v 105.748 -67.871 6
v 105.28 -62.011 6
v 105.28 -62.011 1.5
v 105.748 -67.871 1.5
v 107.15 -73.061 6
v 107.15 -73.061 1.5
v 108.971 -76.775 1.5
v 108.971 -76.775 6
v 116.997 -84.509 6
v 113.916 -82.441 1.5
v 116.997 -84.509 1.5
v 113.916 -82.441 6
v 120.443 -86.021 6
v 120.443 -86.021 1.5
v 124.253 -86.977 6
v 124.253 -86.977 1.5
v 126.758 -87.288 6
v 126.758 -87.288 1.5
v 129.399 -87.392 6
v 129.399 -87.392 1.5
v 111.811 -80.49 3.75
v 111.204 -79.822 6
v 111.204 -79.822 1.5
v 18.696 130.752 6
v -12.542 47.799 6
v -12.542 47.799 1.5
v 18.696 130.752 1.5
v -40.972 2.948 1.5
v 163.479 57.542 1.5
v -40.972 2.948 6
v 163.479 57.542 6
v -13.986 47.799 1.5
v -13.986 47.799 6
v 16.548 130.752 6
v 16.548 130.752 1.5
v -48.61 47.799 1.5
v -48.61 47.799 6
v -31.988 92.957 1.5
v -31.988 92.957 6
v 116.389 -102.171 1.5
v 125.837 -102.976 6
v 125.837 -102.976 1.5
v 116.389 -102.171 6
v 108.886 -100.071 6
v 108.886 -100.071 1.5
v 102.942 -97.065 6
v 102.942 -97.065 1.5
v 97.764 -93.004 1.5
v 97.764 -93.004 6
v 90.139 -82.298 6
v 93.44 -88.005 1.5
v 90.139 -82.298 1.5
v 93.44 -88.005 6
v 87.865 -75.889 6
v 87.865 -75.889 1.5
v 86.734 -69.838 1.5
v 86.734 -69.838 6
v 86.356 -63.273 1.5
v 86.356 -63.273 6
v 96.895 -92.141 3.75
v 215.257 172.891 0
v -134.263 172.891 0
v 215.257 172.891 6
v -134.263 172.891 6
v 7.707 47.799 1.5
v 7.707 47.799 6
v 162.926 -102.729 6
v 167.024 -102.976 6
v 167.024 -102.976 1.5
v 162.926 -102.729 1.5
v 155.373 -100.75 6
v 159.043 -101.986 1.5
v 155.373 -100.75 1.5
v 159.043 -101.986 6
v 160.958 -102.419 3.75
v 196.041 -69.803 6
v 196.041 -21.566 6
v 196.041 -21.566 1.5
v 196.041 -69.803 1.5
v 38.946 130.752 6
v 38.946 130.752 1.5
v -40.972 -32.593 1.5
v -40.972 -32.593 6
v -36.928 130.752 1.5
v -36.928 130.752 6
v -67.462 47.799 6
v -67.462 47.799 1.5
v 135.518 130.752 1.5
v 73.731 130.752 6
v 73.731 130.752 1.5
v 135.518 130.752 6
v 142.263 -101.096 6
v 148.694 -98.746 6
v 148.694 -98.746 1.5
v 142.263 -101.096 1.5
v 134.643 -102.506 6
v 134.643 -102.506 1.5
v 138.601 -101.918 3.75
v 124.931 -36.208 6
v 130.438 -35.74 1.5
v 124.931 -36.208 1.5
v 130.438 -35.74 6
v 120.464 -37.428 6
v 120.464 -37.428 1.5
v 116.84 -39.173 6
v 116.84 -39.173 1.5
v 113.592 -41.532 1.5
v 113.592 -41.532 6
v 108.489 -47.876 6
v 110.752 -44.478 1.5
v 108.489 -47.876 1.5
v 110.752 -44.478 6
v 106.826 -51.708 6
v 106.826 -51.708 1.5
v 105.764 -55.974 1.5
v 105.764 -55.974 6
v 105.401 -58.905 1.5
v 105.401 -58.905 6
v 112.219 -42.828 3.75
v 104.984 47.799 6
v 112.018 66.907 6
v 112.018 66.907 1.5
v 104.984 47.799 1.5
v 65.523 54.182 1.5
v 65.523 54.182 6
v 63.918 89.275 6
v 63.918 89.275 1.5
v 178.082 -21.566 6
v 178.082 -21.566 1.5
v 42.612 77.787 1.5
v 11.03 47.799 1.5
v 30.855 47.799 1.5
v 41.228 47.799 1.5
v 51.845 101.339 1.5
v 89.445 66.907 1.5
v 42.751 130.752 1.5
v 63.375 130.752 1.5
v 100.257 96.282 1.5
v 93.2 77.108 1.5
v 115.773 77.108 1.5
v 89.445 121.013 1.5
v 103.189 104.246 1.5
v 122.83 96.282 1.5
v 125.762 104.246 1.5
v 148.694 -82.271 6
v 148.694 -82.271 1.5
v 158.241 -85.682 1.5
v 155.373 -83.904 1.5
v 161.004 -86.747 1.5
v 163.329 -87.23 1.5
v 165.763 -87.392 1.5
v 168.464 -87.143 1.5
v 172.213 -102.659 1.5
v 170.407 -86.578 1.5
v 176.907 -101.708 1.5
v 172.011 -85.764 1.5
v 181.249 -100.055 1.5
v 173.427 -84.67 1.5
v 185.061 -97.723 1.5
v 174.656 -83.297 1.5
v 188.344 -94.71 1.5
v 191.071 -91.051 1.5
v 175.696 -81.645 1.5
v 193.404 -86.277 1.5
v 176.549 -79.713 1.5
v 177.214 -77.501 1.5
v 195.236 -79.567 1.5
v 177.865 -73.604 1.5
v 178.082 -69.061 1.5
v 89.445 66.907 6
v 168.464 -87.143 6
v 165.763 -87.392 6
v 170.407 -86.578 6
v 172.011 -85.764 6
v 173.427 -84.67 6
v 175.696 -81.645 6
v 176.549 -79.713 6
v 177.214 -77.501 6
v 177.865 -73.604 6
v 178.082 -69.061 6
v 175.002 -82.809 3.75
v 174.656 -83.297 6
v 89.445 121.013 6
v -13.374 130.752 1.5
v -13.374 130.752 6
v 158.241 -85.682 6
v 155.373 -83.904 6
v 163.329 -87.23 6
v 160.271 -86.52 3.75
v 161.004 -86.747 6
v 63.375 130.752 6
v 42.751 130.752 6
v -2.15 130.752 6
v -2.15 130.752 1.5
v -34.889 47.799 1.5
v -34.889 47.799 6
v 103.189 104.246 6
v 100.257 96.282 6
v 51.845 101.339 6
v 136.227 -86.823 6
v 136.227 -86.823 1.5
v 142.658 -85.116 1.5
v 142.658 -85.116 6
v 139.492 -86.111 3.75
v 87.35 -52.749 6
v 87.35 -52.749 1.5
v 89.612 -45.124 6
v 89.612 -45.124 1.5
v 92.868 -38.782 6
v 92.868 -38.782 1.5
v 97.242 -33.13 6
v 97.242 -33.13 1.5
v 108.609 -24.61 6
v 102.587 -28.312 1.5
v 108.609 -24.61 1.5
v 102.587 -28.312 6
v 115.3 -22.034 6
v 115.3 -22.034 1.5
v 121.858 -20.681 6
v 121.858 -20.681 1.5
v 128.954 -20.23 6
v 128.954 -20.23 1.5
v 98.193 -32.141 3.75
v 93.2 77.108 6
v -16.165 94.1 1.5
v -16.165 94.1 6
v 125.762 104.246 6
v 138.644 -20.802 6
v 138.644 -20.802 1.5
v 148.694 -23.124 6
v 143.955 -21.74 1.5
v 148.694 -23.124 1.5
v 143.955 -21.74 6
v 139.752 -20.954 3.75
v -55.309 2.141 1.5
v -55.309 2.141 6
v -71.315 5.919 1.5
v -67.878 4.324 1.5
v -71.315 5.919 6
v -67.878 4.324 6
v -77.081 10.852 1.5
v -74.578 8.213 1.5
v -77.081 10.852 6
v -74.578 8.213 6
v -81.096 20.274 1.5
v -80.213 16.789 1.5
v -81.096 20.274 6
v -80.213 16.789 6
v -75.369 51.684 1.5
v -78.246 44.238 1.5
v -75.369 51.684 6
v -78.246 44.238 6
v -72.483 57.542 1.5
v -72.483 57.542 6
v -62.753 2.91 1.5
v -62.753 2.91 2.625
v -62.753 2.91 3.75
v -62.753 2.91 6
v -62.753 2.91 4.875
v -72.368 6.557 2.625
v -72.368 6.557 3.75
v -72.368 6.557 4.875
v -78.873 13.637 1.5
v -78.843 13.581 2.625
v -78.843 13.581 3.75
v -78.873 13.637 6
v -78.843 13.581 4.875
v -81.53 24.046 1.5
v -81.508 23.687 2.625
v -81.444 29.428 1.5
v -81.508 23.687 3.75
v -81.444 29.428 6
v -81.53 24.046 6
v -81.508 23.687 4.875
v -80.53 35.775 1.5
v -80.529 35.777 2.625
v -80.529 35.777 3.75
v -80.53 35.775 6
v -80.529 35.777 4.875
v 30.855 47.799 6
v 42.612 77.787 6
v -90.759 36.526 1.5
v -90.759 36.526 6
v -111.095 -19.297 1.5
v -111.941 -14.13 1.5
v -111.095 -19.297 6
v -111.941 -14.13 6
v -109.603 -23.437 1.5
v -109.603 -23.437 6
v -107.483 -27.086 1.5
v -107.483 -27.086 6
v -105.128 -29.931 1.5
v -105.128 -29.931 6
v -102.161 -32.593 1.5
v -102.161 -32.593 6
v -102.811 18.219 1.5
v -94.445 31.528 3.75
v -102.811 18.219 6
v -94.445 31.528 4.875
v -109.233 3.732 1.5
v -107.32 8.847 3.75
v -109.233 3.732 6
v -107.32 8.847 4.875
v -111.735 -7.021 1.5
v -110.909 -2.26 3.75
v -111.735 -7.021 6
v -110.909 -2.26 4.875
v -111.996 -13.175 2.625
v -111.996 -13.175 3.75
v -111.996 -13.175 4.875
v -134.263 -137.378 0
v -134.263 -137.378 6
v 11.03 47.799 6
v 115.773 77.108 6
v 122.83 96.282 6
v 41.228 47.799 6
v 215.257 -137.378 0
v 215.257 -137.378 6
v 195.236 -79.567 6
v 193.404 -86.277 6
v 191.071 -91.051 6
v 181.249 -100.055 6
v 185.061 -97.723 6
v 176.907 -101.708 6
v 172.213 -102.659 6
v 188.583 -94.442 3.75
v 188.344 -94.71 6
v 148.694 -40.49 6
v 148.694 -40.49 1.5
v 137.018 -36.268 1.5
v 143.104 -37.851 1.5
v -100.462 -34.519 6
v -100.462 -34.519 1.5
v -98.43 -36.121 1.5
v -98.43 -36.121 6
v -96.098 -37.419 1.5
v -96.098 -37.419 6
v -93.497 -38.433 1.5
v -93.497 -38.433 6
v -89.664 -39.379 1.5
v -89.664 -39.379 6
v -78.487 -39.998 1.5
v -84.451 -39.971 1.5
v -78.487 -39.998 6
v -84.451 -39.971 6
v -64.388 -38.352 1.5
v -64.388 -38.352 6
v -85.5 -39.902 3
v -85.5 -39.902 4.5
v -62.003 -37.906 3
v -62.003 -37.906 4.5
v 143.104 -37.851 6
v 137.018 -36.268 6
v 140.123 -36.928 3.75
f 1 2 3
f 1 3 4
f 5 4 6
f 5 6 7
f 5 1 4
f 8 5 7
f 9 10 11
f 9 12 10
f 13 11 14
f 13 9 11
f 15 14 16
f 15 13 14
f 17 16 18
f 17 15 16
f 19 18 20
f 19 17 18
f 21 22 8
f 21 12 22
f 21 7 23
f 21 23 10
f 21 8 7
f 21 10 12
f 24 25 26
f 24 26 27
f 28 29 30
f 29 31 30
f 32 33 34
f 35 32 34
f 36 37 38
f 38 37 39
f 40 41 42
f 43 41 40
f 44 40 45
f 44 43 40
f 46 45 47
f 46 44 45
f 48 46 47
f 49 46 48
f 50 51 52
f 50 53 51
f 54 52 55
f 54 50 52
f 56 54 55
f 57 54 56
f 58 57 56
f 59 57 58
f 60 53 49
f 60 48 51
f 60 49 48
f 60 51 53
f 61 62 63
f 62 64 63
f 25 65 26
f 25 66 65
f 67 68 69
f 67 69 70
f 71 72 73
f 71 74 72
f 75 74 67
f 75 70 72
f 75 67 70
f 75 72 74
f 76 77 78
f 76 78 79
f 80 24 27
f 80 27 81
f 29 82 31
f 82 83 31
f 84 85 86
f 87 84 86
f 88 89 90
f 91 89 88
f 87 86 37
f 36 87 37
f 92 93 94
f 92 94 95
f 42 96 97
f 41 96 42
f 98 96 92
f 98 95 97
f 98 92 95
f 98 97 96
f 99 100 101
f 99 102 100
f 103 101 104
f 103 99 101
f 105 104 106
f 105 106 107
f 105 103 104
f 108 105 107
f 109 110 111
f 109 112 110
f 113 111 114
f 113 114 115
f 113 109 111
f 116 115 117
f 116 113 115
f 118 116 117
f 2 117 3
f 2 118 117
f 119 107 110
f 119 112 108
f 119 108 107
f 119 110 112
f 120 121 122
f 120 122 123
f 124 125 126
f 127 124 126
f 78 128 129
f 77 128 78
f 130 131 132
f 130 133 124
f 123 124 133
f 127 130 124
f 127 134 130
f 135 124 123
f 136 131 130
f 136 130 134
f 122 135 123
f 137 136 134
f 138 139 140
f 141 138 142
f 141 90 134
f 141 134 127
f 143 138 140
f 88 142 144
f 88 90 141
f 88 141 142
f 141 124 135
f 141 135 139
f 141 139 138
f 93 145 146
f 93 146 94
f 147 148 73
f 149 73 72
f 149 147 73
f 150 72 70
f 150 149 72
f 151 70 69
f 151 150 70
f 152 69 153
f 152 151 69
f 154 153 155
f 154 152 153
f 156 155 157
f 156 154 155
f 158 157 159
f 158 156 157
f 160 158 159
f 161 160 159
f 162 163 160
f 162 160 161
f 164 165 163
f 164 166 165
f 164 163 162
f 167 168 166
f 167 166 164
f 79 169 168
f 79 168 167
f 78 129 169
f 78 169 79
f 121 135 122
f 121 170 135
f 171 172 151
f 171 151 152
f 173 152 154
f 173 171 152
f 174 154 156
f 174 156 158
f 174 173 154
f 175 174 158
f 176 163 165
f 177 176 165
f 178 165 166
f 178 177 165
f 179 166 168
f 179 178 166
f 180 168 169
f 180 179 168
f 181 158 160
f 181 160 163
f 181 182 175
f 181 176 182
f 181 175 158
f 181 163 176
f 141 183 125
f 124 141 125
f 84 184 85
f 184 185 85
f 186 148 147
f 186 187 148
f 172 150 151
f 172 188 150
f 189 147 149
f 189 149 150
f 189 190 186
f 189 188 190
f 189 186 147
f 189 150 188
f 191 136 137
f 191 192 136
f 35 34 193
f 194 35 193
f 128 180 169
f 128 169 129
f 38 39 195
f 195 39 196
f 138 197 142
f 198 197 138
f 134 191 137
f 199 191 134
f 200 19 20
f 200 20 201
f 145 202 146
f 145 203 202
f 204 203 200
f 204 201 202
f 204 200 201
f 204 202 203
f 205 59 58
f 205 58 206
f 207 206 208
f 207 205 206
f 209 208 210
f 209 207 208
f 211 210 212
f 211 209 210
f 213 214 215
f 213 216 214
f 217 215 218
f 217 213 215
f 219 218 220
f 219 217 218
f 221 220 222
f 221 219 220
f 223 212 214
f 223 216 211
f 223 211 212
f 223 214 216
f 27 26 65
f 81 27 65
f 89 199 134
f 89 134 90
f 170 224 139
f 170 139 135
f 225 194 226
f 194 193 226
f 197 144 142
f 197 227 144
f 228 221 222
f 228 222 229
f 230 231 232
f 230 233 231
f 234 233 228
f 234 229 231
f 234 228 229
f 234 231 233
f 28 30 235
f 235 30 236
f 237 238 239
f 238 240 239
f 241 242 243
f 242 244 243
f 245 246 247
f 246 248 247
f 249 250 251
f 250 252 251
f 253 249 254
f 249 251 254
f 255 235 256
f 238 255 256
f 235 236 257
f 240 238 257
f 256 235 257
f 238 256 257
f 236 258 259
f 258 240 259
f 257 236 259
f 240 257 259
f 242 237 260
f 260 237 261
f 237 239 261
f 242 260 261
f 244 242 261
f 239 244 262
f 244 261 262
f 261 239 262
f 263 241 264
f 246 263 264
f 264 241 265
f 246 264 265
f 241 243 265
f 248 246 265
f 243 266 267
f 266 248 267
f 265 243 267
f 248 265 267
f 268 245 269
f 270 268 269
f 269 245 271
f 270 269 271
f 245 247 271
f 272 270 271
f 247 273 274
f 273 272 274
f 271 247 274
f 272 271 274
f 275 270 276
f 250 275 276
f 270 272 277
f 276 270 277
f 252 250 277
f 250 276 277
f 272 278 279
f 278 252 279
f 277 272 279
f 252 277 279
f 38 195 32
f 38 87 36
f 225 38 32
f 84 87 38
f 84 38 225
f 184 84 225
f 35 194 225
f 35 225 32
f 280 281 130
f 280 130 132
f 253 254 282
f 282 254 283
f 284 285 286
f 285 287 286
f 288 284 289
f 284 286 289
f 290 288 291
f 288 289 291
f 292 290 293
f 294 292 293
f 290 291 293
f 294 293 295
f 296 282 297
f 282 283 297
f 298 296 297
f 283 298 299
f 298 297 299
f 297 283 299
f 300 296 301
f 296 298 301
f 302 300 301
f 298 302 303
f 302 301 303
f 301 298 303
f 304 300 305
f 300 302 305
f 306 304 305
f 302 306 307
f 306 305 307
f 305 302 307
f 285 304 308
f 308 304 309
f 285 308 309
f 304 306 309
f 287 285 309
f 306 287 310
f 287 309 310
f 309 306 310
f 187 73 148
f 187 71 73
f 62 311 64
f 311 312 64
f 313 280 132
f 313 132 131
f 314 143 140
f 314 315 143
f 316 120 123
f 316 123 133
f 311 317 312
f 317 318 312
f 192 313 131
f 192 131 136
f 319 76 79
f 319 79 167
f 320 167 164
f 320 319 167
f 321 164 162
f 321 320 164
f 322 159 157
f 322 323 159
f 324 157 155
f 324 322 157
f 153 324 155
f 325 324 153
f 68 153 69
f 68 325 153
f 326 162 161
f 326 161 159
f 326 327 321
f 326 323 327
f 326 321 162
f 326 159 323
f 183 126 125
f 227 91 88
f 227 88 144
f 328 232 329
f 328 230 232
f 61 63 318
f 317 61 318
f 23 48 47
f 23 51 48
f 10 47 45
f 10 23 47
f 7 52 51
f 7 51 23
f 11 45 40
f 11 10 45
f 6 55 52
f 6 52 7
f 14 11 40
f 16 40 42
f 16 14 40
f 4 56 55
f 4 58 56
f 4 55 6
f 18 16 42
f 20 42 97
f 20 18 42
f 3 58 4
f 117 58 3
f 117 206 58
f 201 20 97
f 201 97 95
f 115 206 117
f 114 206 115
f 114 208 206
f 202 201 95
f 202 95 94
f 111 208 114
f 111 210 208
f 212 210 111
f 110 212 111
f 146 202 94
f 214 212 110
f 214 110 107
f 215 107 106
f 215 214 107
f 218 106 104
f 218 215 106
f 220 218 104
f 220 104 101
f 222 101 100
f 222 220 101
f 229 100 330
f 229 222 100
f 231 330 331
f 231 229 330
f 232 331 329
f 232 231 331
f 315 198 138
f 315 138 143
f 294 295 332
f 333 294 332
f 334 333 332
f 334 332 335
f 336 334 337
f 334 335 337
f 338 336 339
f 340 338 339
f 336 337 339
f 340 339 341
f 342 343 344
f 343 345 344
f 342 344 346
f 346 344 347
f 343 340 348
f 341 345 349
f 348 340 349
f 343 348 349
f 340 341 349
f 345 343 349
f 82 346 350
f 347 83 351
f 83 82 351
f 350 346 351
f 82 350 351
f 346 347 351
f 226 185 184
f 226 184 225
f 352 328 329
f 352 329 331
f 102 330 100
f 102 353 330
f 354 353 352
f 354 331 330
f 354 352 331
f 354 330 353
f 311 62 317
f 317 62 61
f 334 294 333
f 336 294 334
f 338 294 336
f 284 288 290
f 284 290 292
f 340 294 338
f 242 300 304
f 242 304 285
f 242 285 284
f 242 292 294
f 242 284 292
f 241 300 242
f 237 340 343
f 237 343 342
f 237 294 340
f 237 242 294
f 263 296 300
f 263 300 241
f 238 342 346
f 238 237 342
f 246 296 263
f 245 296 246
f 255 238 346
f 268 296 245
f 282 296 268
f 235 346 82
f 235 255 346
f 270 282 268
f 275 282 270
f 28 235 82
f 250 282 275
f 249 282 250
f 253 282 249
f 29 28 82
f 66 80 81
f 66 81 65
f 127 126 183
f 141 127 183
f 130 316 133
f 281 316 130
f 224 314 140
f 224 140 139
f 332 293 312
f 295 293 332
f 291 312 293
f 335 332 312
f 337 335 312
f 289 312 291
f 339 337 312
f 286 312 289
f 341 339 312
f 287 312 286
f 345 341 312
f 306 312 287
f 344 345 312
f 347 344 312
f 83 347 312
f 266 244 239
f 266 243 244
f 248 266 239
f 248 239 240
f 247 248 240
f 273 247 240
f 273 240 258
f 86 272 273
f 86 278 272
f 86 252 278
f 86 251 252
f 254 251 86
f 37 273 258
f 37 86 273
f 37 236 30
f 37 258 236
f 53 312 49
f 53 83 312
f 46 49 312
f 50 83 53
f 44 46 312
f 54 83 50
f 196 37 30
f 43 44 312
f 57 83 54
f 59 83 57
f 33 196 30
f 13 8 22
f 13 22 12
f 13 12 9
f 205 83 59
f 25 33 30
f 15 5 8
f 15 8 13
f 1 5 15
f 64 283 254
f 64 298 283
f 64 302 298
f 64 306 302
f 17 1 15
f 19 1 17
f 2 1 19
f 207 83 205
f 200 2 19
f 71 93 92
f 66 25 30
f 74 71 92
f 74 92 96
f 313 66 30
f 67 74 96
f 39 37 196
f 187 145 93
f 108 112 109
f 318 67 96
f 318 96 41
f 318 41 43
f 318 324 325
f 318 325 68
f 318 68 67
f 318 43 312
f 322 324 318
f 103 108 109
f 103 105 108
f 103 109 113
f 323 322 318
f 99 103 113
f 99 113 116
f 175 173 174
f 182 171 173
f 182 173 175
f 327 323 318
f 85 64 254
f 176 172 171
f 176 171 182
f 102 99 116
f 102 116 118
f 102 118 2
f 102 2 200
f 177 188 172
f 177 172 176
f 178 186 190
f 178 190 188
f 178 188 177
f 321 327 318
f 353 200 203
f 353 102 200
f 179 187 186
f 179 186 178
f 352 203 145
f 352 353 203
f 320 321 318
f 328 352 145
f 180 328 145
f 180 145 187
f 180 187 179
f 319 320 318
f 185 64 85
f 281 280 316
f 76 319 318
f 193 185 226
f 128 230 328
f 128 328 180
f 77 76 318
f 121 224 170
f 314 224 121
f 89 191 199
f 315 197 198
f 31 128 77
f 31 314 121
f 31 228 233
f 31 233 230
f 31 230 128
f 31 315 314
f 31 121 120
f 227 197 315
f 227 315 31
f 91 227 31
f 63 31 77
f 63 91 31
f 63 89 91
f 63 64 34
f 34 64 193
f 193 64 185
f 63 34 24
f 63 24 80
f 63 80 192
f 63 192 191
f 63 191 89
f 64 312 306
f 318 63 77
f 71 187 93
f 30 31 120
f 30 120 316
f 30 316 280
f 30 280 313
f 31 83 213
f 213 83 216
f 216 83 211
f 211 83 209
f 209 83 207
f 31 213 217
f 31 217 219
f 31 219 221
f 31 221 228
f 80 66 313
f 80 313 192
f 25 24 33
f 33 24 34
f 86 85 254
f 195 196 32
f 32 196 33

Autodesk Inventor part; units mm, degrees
ref_plane "YZ Plane" through (0, 0, 0) normal (1, 0, 0) x (0, 1, 0)
ref_plane "XZ Plane" through (0, 0, 0) normal (0, 1, 0) x (-1, 0, 0)
ref_plane "XY Plane" through (0, 0, 0) normal (0, 0, 1) x (1, 0, 0)
sketch "Boceto1" plane through (0, 0, 0) normal (0, 0, 1) x (1, 0, 0)
  line L0 (-250, -250) -> (250, -250)
  line L1 (250, -250) -> (250, 250)
  line L2 (250, 250) -> (-250, 250)
  line L3 (-250, 250) -> (-250, -250)
  line L4 (-250, -250) -> (250, 250) construction
  line L5 (250, -250) -> (-250, 250) construction
  point P0 (0, 0)
  dimension "d0" = 500
  dimension "d1" = 500
extrude "Extrusión1" add sketch "Boceto1" along normal blind 6
sketch "Boceto4" plane through (0, 0, 6) normal (0, 0, 1) x (1, 0, 0)
  line L0 (-122.9682, 69.533) -> (177.0318, 69.533) construction
  line L1 (177.0318, 69.533) -> (177.0318, -53.8632) construction
  line L2 (177.0318, -53.8632) -> (-122.9682, -53.8632) construction
  line L3 (-122.9682, -53.8632) -> (-122.9682, 69.533) construction
  line L4 (163.4789, 57.5416) -> (-40.9722, 2.948)
  spline S0 degree 4 poles (-40.9722, 2.948) (-59.3478, 1.0194) (-98.1126, -3.325) (-80.4924, 43.1707) (-72.4826, 57.5416) knots 0 0 0 0 0 1 1 1 1 1
  spline S1 degree 4 poles (-72.4826, 57.5416) (-101.0846, 27.8162) (-107.584, 11.7419) (-123.1576, -16.2785) (-102.1609, -32.5927) knots 0 0 0 0 0 1 1 1 1 1
  spline S2 degree 3 poles (-102.1609, -32.5927) (-92.0174, -46.5521) (-57.6708, -37.567) (-40.9722, -32.5927) knots 0 0 0 0 1 1 1 1
  line L5 (-40.9722, -32.5927) -> (163.4789, 57.5416)
  point P0 (0, 0)
  point P1 (-62.9545, 2.949)
  point P2 (-77.976, 12.1095)
  point P3 (-80.9081, 33.7265)
  point P4 (-98.8634, 24.932)
  point P5 (-109.4889, 2.9481)
  point P6 (-111.753, -15.9522)
  point P7 (-88.6041, -39.5543)
  point P8 (-62.956, -38.0886)
  dimension "d19" = 300
extrude "Extrusión4" cut sketch "Boceto4" against normal blind 4.5
sketch "Boceto6" plane through (0, 0, 6) normal (0, 0, 1) x (1, 0, 0)
  line L0 (82.2007, -20.2301) -> (276.8192, -20.2301) construction
  line L1 (276.8192, -20.2301) -> (276.8192, -107.8084) construction
  line L2 (276.8192, -107.8084) -> (82.2007, -107.8084) construction
  line L3 (82.2007, -107.8084) -> (82.2007, -20.2301) construction
  spline S0 degree 2 poles (148.6942, -98.7459) (139.9372, -102.9759) (125.8371, -102.9759) knots 0 0 0 1 1 1
  spline S1 degree 2 poles (125.8371, -102.9759) (107.4326, -102.9759) (86.3565, -81.3061) (86.3565, -63.2728) knots 0 0 0 1 2 2 2
  spline S2 degree 2 poles (86.3565, -63.2728) (86.3565, -44.052) (110.03, -20.2301) (128.9539, -20.2301) knots 0 0 0 1 2 2 2
  spline S3 degree 2 poles (128.9539, -20.2301) (140.6794, -20.2301) (148.6942, -23.1243) knots 0 0 0 1 1 1
  line L4 (148.6942, -23.1243) -> (148.6942, -40.4898)
  spline S4 degree 2 poles (148.6942, -40.4898) (140.6794, -35.7403) (130.4382, -35.7403) knots 0 0 0 1 1 1
  spline S5 degree 2 poles (130.4382, -35.7403) (119.158, -35.7403) (105.2805, -49.9147) (105.2805, -62.0112) knots 0 0 0 1 2 2 2
  spline S6 degree 2 poles (105.2805, -62.0112) (105.2805, -73.5882) (118.3417, -87.3915) (129.3992, -87.3915) knots 0 0 0 1 2 2 2
  spline S7 degree 2 poles (129.3992, -87.3915) (139.9372, -87.3915) (148.6942, -82.2709) knots 0 0 0 1 1 1
  line L5 (148.6942, -82.2709) -> (148.6942, -98.7459)
  spline S8 degree 2 poles (196.0411, -69.8034) (196.0411, -85.9073) (181.1246, -102.9759) (167.0244, -102.9759) knots 0 0 0 1 2 2 2
  spline S9 degree 2 poles (167.0244, -102.9759) (160.7165, -102.9759) (155.3732, -100.7496) knots 0 0 0 1 1 1
  line L6 (155.3732, -100.7496) -> (155.3732, -83.9036)
  spline S10 degree 2 poles (155.3732, -83.9036) (159.9744, -87.3915) (165.7629, -87.3915) knots 0 0 0 1 1 1
  spline S11 degree 2 poles (165.7629, -87.3915) (178.082, -87.3915) (178.082, -69.0613) knots 0 0 0 1 1 1
  line L7 (178.082, -69.0613) -> (178.082, -21.5659)
  line L8 (178.082, -21.5659) -> (196.0411, -21.5659)
  line L9 (196.0411, -21.5659) -> (196.0411, -69.8034)
  point P0 (0, 0)
extrude "Extrusión5" cut sketch "Boceto6" against normal blind 4.5
sketch "Boceto7" plane through (0, 0, 6) normal (0, 0, 1) x (1, 0, 0)
  line L0 (-96.8701, 190.9254) -> (156.7066, 190.9254) construction
  line L1 (156.7066, 190.9254) -> (156.7066, -16.508) construction
  line L2 (156.7066, -16.508) -> (-96.8701, -16.508) construction
  line L3 (-96.8701, -16.508) -> (-96.8701, 190.9254) construction
  line L4 (-67.4617, 47.7989) -> (-48.6104, 47.7989)
  line L5 (-48.6104, 47.7989) -> (-31.9884, 92.9574)
  line L6 (-31.9884, 92.9574) -> (-34.8888, 47.7989)
  line L7 (-34.8888, 47.7989) -> (-13.9857, 47.7989)
  line L8 (-13.9857, 47.7989) -> (16.5477, 130.7517)
  line L9 (16.5477, 130.7517) -> (-2.1497, 130.7517)
  line L10 (-13.3744, 130.7517) -> (-36.9283, 130.7517)
  line L11 (-36.9283, 130.7517) -> (-67.4617, 47.7989)
  line L12 (7.7072, 47.7989) -> (-12.5423, 47.7989)
  line L13 (-12.5423, 47.7989) -> (18.6965, 130.7517)
  line L14 (18.6965, 130.7517) -> (38.946, 130.7517)
  line L15 (38.946, 130.7517) -> (7.7072, 47.7989)
  line L16 (-13.3744, 130.7517) -> (-16.165, 94.0996)
  line L17 (-2.1497, 130.7517) -> (-16.165, 94.0996)
  line L18 (42.7507, 130.7517) -> (63.3753, 130.7517)
  line L19 (63.3753, 130.7517) -> (51.8446, 101.3389)
  line L20 (51.8446, 101.3389) -> (73.7311, 130.7517)
  line L21 (73.7311, 130.7517) -> (135.5179, 130.7517)
  line L22 (135.5179, 130.7517) -> (125.7617, 104.2462)
  line L23 (125.7617, 104.2462) -> (103.1886, 104.2462)
  line L24 (103.1886, 104.2462) -> (100.257, 96.2815)
  line L25 (100.257, 96.2815) -> (122.8301, 96.2815)
  line L26 (122.8301, 96.2815) -> (115.7727, 77.108)
  line L27 (115.7727, 77.108) -> (93.1995, 77.108)
  line L28 (93.1995, 77.108) -> (89.4446, 66.9066)
  line L29 (89.4446, 66.9066) -> (112.0177, 66.9066)
  line L30 (112.0177, 66.9066) -> (104.9845, 47.7989)
  line L31 (104.9845, 47.7989) -> (41.2278, 47.7989)
  line L32 (41.2278, 47.7989) -> (42.6118, 77.7874)
  line L33 (42.6118, 77.7874) -> (30.8554, 47.7989)
  line L34 (11.0305, 47.7989) -> (42.7507, 130.7517)
  line L35 (30.8554, 47.7989) -> (11.0305, 47.7989)
  line L36 (89.4446, 121.013) -> (65.5232, 54.1821)
  line L37 (65.5232, 54.1821) -> (63.9179, 89.2753)
  line L38 (63.9179, 89.2753) -> (89.4446, 121.013)
  point P0 (0, 0)
extrude "Extrusión6" cut sketch "Boceto7" against normal blind 4.5
sketch "Boceto8" plane through (0, 0, 6) normal (0, 0, 1) x (1, 0, 0)
  line L0 (-134.2632, 172.8911) -> (215.2572, 172.8911)
  line L1 (215.2572, 172.8911) -> (215.2572, -137.3783)
  line L2 (215.2572, -137.3783) -> (-134.2632, -137.3783)
  line L3 (-134.2632, -137.3783) -> (-134.2632, 172.8911)
  line L4 (250, 250) -> (-250, 250) projected
  line L5 (250, -250) -> (250, 250) projected
  line L6 (-250, 250) -> (250, 250)
  line L7 (250, 250) -> (250, -250)
  line L8 (250, -250) -> (-250, -250)
  line L9 (-250, -250) -> (-250, 250)
  point P0 (0, 0)
extrude "Extrusión7" cut sketch "Boceto8" against normal blind 133.25
equation "\"d1\" = d0"
properties part number "Silueta_nike_nombres"
